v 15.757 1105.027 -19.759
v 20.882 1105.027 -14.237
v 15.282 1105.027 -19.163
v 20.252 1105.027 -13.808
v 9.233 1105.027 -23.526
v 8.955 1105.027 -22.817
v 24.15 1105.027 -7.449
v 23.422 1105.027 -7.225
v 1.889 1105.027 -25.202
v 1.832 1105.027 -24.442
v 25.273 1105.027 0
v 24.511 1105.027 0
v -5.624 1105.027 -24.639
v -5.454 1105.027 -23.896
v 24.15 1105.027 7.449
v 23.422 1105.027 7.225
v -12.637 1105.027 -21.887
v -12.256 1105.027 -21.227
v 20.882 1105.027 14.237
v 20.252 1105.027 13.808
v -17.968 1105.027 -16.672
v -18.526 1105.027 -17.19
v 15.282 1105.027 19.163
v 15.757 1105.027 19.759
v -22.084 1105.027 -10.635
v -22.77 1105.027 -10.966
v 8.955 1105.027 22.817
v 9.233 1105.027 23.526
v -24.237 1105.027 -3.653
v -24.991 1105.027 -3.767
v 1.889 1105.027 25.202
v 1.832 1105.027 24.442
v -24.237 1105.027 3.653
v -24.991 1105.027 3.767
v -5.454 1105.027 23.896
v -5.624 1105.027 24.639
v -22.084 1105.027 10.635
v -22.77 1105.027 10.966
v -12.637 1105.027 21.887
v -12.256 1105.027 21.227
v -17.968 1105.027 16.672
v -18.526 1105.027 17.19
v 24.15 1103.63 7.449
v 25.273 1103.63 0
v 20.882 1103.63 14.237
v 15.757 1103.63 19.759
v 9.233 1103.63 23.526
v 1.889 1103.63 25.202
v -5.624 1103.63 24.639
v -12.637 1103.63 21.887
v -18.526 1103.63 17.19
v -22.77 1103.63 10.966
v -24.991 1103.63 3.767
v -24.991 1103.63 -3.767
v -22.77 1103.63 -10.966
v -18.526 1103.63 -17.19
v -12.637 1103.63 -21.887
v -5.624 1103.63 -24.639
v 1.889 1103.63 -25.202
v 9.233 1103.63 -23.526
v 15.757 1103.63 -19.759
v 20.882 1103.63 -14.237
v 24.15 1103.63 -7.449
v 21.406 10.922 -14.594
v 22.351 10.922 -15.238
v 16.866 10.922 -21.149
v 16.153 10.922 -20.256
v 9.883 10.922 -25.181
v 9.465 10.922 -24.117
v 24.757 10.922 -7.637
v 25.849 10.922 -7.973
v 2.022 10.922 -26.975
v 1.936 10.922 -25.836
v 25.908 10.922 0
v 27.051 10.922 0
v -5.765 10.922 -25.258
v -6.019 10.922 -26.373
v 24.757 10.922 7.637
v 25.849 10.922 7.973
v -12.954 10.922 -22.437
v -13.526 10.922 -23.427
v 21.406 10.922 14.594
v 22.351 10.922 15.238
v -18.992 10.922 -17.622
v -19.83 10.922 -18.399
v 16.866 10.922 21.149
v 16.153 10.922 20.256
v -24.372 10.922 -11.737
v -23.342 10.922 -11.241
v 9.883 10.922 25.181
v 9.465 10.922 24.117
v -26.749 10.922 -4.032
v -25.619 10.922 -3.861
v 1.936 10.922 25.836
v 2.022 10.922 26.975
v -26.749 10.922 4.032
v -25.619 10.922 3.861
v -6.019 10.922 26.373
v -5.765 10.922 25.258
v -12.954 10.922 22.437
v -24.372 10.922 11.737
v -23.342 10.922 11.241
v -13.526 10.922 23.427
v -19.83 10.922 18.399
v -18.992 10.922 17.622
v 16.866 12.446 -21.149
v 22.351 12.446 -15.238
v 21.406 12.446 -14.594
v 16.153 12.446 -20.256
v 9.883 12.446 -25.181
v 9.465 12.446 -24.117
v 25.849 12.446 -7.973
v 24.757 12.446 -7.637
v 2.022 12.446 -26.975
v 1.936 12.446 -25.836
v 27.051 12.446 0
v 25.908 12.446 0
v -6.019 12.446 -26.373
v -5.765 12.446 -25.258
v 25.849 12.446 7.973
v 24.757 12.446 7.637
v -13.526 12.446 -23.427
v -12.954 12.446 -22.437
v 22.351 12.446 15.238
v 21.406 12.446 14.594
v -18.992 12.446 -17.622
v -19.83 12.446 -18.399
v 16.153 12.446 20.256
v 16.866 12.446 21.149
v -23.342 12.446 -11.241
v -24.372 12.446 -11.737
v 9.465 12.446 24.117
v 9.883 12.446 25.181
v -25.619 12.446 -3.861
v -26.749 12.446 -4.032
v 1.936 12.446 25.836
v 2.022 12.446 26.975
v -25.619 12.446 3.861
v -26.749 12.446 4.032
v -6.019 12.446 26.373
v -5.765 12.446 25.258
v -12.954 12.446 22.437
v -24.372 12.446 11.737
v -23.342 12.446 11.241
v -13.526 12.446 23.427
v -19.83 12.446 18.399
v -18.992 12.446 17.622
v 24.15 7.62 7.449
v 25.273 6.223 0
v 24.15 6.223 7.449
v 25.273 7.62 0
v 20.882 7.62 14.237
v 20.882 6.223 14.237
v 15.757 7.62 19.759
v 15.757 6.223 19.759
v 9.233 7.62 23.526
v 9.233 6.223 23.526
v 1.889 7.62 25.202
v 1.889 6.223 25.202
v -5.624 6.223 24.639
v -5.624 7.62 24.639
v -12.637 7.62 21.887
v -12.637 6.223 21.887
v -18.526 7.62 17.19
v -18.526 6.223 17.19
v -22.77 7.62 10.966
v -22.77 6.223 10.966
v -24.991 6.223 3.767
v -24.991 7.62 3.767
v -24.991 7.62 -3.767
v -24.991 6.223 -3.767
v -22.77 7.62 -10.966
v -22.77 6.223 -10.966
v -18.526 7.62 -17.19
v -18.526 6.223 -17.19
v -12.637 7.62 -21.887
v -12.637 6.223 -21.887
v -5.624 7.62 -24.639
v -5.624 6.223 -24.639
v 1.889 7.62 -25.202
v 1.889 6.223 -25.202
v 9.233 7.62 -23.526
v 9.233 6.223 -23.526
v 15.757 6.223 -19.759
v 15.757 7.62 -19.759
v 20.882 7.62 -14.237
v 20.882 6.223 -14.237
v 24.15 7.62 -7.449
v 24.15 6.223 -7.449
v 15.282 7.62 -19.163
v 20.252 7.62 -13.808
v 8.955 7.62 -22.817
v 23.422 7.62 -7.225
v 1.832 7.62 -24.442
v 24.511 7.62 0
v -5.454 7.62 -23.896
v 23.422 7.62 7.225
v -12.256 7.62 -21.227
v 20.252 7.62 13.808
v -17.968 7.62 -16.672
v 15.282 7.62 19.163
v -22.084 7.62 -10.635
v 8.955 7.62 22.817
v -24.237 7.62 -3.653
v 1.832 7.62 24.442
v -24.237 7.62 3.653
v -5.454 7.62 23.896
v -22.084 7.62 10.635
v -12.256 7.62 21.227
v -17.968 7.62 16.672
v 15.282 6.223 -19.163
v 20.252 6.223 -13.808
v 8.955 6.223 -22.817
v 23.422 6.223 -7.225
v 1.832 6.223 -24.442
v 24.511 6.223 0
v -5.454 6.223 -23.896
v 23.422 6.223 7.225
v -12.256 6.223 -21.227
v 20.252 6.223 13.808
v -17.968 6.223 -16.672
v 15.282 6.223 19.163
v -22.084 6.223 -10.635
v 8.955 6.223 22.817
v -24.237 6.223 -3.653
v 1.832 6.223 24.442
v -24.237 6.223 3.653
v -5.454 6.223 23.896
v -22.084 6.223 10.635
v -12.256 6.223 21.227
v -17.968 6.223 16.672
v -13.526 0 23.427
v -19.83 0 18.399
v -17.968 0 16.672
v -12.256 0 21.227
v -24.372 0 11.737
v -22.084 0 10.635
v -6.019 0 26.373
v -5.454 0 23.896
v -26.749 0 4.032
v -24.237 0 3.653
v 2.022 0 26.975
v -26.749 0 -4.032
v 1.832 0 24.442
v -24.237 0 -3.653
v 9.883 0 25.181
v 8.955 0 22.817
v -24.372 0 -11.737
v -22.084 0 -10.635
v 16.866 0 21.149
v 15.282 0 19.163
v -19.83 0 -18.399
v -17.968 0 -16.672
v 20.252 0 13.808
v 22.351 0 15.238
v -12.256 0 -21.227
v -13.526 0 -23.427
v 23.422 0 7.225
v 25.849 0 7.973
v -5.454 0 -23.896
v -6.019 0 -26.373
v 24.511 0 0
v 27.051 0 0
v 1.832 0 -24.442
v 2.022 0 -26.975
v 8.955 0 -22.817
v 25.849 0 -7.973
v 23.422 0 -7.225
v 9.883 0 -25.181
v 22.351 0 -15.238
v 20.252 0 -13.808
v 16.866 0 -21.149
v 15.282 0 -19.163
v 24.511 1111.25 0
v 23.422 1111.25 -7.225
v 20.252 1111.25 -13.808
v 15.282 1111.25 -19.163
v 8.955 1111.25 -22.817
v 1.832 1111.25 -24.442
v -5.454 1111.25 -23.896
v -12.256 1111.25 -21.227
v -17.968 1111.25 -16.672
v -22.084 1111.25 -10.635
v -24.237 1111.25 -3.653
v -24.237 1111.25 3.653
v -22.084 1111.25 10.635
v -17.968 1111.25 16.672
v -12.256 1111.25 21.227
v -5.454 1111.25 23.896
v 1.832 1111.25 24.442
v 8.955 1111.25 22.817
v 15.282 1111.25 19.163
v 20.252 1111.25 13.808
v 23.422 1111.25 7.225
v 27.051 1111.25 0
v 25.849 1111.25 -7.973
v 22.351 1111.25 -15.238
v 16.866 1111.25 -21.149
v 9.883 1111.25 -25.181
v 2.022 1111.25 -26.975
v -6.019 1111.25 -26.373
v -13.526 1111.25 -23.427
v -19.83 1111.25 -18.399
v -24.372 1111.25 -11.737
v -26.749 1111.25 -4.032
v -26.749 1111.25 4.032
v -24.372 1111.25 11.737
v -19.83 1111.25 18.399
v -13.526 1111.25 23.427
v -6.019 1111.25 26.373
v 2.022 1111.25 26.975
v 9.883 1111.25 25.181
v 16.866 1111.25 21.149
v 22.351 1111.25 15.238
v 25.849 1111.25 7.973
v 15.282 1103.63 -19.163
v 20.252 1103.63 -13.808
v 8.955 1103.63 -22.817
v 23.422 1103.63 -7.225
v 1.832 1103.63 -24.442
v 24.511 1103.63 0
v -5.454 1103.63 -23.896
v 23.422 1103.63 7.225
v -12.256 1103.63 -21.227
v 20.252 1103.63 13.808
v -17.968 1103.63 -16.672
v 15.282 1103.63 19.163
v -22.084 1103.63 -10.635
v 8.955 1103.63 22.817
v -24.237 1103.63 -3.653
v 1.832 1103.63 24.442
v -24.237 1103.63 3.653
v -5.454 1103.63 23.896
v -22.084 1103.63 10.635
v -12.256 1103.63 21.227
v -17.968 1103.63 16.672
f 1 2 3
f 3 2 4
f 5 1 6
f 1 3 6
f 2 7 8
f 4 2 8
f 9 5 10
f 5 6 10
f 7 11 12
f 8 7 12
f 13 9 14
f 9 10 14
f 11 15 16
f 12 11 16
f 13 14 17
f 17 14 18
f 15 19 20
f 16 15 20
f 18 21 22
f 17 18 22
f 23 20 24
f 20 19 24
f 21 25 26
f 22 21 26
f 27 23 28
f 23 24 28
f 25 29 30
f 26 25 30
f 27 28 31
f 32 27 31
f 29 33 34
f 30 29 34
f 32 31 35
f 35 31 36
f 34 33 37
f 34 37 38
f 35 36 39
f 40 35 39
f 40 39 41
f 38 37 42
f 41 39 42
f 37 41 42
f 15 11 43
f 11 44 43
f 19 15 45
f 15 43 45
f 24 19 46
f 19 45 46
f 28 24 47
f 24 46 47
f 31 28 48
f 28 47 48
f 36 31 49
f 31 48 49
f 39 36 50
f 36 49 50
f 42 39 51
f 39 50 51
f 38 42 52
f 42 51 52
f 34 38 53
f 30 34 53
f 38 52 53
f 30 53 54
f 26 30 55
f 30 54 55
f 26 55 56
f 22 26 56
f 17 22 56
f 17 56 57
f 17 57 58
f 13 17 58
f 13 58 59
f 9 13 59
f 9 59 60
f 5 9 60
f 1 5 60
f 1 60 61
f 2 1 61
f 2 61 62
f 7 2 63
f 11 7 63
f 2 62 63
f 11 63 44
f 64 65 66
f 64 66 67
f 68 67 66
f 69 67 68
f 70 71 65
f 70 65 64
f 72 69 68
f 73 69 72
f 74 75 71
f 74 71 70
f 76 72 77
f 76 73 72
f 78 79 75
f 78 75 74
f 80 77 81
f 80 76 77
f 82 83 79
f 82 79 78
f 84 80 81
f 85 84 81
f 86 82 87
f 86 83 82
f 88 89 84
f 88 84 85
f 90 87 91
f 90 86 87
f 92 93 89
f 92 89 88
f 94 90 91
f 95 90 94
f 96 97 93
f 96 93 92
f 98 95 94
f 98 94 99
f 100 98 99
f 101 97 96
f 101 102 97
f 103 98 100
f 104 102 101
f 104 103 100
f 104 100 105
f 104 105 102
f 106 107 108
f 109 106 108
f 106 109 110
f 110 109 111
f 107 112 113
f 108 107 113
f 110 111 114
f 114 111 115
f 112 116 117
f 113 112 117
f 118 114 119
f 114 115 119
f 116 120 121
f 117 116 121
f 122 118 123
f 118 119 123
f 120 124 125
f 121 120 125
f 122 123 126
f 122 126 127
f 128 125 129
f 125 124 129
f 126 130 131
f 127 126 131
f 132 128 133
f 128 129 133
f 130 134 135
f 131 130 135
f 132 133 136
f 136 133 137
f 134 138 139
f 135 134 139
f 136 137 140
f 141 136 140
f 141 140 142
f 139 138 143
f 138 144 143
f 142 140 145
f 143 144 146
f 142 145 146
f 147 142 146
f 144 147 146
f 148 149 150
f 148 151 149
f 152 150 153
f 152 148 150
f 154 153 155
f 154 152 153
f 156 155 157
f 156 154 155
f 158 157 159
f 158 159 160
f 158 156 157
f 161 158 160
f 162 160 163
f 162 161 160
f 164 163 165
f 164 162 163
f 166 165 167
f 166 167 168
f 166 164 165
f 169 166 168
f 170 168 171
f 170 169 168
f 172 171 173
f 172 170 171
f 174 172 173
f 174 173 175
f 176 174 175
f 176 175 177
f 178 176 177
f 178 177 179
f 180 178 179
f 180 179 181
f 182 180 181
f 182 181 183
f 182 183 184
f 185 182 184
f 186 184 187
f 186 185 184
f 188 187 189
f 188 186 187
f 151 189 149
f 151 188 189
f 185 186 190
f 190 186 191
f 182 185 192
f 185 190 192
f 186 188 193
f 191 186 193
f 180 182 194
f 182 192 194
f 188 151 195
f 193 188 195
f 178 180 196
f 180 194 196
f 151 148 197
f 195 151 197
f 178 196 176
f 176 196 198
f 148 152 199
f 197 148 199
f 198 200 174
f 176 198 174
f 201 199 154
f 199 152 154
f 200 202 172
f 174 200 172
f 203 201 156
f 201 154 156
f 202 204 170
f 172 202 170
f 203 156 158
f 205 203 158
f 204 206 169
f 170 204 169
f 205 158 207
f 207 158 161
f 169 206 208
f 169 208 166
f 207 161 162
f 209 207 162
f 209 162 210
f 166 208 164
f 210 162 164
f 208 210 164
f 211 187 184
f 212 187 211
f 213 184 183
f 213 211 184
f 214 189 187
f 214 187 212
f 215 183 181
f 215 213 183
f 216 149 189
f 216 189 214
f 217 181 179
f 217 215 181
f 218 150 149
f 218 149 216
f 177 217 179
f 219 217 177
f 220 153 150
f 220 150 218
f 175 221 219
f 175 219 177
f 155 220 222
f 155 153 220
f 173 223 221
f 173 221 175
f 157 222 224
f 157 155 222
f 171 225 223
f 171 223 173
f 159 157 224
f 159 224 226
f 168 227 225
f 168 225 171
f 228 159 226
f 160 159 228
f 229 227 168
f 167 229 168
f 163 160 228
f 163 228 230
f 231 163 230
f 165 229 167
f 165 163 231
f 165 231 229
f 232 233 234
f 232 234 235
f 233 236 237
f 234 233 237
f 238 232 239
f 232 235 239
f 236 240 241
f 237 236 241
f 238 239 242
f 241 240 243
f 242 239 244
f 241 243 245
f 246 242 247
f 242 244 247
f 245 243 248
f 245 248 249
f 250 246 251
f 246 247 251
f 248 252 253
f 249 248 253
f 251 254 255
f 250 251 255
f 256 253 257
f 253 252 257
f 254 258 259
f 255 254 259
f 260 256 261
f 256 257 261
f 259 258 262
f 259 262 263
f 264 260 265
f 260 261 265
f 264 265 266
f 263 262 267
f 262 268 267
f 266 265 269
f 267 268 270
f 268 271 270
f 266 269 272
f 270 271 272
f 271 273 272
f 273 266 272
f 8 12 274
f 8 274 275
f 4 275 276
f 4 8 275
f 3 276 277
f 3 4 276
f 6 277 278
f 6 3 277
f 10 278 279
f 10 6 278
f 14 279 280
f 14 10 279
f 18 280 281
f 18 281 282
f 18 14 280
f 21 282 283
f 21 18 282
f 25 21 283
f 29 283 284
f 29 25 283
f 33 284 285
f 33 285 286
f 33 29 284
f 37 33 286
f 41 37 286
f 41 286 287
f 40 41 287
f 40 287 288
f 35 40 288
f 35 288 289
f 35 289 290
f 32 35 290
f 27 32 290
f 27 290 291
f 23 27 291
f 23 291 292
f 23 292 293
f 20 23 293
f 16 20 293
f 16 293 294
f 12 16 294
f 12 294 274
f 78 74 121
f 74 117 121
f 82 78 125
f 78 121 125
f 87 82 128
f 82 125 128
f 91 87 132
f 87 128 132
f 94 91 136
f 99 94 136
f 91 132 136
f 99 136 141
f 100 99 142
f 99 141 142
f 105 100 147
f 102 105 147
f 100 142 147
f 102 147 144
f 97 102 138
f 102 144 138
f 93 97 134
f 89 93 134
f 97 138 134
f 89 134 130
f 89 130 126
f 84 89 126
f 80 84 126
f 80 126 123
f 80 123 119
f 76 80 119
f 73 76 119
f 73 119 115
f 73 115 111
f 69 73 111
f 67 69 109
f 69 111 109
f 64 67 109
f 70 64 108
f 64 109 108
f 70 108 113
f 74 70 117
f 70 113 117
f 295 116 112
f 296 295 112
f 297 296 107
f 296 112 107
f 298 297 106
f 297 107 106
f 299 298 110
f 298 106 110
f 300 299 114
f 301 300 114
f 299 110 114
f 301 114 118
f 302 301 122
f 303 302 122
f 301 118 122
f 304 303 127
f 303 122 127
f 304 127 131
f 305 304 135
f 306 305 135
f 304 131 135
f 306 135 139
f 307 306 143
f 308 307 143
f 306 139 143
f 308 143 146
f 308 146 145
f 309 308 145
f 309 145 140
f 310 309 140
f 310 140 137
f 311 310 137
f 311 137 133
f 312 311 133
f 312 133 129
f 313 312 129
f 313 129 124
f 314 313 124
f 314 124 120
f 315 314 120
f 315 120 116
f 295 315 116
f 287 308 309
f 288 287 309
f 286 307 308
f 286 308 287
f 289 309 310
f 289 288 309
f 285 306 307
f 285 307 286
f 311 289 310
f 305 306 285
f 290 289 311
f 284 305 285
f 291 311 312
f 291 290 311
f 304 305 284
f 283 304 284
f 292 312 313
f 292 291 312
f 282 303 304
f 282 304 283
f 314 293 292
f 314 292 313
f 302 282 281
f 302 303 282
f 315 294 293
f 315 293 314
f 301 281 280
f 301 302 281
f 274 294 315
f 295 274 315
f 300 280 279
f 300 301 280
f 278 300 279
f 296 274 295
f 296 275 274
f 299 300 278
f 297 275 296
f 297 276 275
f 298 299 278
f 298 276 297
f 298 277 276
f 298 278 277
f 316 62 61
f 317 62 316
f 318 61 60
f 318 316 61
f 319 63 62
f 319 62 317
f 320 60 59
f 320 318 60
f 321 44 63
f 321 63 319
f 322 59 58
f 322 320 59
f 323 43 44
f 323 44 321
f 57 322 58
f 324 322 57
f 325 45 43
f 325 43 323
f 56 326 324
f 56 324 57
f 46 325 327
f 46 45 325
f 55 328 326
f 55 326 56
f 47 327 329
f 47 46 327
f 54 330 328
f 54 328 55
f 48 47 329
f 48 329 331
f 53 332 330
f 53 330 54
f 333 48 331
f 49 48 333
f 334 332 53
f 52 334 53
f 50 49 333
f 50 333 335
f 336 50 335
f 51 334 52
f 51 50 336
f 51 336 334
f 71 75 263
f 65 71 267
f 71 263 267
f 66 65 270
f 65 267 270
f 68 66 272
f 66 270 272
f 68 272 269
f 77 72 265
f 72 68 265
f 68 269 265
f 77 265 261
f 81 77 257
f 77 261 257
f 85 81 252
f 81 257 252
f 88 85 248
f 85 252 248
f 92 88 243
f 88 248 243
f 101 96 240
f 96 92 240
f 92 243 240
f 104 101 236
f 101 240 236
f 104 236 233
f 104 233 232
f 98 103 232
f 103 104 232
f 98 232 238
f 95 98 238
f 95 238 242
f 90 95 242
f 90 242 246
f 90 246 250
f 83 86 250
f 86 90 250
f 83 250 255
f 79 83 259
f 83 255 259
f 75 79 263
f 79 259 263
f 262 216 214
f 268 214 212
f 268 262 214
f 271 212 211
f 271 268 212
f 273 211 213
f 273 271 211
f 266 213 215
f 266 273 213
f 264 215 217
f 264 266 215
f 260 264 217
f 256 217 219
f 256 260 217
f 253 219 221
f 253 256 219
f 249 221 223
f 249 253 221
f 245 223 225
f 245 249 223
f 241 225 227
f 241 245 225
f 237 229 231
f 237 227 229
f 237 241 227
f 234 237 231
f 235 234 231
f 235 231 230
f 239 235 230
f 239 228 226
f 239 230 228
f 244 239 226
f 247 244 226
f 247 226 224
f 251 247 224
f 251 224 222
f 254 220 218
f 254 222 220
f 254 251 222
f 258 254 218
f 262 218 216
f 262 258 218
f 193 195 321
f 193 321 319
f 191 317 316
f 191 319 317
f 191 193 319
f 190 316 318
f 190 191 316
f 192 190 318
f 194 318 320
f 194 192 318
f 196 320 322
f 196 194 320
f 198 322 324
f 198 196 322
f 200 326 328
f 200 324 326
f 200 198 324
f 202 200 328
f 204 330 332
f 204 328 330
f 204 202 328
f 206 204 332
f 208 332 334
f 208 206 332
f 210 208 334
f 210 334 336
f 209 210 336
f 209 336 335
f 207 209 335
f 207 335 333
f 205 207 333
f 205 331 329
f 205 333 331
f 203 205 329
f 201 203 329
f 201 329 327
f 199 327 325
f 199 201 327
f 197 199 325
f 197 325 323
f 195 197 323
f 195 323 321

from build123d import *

# Parameters (mm, degrees)
SKETCH1_R           = 27.051
SKETCH1_R_2         = 24.511
BOSS_EXTRUDE1_DEPTH = 1111.25
SKETCH2_W           = 2.54
SKETCH2_H           = 1.397
SKETCH11_W          = 1.796741038
SKETCH11_H          = 1.524


with BuildPart() as part:
    # Sketch1 → Boss-Extrude1 (new body)
    with BuildSketch(Plane(origin=(0, 0, 0), x_dir=(1, 0, 0), z_dir=(0, 1, 0))):
        Circle(SKETCH1_R)
        Circle(SKETCH1_R_2, mode=Mode.SUBTRACT)
    extrude(amount=BOSS_EXTRUDE1_DEPTH)

    # Sketch2 → Cut-Revolve1 (revolve, cut)
    with BuildSketch(Plane.XY):
        with Locations((24.003, 6.9215)):
            Rectangle(SKETCH2_W, SKETCH2_H)
    cut_revolve1 = revolve(axis=Axis((0, 1111.25, 0), (0, -1, 0)), mode=Mode.SUBTRACT)

    # Mirror1: Cut-Revolve1 across plane
    add(cut_revolve1.mirror(Plane(origin=(0, 555.625, 0), x_dir=(0, 0, 1), z_dir=(0, -1, 0))), mode=Mode.SUBTRACT)

    # Sketch11 → Cut-Revolve3 (revolve, cut)
    with BuildSketch(Plane.XY):
        with Locations((26.806370519, 11.684)):
            Rectangle(SKETCH11_W, SKETCH11_H)
    revolve(axis=Axis((0, 1111.25, 0), (0, -1, 0)), mode=Mode.SUBTRACT)


solid = part.part
